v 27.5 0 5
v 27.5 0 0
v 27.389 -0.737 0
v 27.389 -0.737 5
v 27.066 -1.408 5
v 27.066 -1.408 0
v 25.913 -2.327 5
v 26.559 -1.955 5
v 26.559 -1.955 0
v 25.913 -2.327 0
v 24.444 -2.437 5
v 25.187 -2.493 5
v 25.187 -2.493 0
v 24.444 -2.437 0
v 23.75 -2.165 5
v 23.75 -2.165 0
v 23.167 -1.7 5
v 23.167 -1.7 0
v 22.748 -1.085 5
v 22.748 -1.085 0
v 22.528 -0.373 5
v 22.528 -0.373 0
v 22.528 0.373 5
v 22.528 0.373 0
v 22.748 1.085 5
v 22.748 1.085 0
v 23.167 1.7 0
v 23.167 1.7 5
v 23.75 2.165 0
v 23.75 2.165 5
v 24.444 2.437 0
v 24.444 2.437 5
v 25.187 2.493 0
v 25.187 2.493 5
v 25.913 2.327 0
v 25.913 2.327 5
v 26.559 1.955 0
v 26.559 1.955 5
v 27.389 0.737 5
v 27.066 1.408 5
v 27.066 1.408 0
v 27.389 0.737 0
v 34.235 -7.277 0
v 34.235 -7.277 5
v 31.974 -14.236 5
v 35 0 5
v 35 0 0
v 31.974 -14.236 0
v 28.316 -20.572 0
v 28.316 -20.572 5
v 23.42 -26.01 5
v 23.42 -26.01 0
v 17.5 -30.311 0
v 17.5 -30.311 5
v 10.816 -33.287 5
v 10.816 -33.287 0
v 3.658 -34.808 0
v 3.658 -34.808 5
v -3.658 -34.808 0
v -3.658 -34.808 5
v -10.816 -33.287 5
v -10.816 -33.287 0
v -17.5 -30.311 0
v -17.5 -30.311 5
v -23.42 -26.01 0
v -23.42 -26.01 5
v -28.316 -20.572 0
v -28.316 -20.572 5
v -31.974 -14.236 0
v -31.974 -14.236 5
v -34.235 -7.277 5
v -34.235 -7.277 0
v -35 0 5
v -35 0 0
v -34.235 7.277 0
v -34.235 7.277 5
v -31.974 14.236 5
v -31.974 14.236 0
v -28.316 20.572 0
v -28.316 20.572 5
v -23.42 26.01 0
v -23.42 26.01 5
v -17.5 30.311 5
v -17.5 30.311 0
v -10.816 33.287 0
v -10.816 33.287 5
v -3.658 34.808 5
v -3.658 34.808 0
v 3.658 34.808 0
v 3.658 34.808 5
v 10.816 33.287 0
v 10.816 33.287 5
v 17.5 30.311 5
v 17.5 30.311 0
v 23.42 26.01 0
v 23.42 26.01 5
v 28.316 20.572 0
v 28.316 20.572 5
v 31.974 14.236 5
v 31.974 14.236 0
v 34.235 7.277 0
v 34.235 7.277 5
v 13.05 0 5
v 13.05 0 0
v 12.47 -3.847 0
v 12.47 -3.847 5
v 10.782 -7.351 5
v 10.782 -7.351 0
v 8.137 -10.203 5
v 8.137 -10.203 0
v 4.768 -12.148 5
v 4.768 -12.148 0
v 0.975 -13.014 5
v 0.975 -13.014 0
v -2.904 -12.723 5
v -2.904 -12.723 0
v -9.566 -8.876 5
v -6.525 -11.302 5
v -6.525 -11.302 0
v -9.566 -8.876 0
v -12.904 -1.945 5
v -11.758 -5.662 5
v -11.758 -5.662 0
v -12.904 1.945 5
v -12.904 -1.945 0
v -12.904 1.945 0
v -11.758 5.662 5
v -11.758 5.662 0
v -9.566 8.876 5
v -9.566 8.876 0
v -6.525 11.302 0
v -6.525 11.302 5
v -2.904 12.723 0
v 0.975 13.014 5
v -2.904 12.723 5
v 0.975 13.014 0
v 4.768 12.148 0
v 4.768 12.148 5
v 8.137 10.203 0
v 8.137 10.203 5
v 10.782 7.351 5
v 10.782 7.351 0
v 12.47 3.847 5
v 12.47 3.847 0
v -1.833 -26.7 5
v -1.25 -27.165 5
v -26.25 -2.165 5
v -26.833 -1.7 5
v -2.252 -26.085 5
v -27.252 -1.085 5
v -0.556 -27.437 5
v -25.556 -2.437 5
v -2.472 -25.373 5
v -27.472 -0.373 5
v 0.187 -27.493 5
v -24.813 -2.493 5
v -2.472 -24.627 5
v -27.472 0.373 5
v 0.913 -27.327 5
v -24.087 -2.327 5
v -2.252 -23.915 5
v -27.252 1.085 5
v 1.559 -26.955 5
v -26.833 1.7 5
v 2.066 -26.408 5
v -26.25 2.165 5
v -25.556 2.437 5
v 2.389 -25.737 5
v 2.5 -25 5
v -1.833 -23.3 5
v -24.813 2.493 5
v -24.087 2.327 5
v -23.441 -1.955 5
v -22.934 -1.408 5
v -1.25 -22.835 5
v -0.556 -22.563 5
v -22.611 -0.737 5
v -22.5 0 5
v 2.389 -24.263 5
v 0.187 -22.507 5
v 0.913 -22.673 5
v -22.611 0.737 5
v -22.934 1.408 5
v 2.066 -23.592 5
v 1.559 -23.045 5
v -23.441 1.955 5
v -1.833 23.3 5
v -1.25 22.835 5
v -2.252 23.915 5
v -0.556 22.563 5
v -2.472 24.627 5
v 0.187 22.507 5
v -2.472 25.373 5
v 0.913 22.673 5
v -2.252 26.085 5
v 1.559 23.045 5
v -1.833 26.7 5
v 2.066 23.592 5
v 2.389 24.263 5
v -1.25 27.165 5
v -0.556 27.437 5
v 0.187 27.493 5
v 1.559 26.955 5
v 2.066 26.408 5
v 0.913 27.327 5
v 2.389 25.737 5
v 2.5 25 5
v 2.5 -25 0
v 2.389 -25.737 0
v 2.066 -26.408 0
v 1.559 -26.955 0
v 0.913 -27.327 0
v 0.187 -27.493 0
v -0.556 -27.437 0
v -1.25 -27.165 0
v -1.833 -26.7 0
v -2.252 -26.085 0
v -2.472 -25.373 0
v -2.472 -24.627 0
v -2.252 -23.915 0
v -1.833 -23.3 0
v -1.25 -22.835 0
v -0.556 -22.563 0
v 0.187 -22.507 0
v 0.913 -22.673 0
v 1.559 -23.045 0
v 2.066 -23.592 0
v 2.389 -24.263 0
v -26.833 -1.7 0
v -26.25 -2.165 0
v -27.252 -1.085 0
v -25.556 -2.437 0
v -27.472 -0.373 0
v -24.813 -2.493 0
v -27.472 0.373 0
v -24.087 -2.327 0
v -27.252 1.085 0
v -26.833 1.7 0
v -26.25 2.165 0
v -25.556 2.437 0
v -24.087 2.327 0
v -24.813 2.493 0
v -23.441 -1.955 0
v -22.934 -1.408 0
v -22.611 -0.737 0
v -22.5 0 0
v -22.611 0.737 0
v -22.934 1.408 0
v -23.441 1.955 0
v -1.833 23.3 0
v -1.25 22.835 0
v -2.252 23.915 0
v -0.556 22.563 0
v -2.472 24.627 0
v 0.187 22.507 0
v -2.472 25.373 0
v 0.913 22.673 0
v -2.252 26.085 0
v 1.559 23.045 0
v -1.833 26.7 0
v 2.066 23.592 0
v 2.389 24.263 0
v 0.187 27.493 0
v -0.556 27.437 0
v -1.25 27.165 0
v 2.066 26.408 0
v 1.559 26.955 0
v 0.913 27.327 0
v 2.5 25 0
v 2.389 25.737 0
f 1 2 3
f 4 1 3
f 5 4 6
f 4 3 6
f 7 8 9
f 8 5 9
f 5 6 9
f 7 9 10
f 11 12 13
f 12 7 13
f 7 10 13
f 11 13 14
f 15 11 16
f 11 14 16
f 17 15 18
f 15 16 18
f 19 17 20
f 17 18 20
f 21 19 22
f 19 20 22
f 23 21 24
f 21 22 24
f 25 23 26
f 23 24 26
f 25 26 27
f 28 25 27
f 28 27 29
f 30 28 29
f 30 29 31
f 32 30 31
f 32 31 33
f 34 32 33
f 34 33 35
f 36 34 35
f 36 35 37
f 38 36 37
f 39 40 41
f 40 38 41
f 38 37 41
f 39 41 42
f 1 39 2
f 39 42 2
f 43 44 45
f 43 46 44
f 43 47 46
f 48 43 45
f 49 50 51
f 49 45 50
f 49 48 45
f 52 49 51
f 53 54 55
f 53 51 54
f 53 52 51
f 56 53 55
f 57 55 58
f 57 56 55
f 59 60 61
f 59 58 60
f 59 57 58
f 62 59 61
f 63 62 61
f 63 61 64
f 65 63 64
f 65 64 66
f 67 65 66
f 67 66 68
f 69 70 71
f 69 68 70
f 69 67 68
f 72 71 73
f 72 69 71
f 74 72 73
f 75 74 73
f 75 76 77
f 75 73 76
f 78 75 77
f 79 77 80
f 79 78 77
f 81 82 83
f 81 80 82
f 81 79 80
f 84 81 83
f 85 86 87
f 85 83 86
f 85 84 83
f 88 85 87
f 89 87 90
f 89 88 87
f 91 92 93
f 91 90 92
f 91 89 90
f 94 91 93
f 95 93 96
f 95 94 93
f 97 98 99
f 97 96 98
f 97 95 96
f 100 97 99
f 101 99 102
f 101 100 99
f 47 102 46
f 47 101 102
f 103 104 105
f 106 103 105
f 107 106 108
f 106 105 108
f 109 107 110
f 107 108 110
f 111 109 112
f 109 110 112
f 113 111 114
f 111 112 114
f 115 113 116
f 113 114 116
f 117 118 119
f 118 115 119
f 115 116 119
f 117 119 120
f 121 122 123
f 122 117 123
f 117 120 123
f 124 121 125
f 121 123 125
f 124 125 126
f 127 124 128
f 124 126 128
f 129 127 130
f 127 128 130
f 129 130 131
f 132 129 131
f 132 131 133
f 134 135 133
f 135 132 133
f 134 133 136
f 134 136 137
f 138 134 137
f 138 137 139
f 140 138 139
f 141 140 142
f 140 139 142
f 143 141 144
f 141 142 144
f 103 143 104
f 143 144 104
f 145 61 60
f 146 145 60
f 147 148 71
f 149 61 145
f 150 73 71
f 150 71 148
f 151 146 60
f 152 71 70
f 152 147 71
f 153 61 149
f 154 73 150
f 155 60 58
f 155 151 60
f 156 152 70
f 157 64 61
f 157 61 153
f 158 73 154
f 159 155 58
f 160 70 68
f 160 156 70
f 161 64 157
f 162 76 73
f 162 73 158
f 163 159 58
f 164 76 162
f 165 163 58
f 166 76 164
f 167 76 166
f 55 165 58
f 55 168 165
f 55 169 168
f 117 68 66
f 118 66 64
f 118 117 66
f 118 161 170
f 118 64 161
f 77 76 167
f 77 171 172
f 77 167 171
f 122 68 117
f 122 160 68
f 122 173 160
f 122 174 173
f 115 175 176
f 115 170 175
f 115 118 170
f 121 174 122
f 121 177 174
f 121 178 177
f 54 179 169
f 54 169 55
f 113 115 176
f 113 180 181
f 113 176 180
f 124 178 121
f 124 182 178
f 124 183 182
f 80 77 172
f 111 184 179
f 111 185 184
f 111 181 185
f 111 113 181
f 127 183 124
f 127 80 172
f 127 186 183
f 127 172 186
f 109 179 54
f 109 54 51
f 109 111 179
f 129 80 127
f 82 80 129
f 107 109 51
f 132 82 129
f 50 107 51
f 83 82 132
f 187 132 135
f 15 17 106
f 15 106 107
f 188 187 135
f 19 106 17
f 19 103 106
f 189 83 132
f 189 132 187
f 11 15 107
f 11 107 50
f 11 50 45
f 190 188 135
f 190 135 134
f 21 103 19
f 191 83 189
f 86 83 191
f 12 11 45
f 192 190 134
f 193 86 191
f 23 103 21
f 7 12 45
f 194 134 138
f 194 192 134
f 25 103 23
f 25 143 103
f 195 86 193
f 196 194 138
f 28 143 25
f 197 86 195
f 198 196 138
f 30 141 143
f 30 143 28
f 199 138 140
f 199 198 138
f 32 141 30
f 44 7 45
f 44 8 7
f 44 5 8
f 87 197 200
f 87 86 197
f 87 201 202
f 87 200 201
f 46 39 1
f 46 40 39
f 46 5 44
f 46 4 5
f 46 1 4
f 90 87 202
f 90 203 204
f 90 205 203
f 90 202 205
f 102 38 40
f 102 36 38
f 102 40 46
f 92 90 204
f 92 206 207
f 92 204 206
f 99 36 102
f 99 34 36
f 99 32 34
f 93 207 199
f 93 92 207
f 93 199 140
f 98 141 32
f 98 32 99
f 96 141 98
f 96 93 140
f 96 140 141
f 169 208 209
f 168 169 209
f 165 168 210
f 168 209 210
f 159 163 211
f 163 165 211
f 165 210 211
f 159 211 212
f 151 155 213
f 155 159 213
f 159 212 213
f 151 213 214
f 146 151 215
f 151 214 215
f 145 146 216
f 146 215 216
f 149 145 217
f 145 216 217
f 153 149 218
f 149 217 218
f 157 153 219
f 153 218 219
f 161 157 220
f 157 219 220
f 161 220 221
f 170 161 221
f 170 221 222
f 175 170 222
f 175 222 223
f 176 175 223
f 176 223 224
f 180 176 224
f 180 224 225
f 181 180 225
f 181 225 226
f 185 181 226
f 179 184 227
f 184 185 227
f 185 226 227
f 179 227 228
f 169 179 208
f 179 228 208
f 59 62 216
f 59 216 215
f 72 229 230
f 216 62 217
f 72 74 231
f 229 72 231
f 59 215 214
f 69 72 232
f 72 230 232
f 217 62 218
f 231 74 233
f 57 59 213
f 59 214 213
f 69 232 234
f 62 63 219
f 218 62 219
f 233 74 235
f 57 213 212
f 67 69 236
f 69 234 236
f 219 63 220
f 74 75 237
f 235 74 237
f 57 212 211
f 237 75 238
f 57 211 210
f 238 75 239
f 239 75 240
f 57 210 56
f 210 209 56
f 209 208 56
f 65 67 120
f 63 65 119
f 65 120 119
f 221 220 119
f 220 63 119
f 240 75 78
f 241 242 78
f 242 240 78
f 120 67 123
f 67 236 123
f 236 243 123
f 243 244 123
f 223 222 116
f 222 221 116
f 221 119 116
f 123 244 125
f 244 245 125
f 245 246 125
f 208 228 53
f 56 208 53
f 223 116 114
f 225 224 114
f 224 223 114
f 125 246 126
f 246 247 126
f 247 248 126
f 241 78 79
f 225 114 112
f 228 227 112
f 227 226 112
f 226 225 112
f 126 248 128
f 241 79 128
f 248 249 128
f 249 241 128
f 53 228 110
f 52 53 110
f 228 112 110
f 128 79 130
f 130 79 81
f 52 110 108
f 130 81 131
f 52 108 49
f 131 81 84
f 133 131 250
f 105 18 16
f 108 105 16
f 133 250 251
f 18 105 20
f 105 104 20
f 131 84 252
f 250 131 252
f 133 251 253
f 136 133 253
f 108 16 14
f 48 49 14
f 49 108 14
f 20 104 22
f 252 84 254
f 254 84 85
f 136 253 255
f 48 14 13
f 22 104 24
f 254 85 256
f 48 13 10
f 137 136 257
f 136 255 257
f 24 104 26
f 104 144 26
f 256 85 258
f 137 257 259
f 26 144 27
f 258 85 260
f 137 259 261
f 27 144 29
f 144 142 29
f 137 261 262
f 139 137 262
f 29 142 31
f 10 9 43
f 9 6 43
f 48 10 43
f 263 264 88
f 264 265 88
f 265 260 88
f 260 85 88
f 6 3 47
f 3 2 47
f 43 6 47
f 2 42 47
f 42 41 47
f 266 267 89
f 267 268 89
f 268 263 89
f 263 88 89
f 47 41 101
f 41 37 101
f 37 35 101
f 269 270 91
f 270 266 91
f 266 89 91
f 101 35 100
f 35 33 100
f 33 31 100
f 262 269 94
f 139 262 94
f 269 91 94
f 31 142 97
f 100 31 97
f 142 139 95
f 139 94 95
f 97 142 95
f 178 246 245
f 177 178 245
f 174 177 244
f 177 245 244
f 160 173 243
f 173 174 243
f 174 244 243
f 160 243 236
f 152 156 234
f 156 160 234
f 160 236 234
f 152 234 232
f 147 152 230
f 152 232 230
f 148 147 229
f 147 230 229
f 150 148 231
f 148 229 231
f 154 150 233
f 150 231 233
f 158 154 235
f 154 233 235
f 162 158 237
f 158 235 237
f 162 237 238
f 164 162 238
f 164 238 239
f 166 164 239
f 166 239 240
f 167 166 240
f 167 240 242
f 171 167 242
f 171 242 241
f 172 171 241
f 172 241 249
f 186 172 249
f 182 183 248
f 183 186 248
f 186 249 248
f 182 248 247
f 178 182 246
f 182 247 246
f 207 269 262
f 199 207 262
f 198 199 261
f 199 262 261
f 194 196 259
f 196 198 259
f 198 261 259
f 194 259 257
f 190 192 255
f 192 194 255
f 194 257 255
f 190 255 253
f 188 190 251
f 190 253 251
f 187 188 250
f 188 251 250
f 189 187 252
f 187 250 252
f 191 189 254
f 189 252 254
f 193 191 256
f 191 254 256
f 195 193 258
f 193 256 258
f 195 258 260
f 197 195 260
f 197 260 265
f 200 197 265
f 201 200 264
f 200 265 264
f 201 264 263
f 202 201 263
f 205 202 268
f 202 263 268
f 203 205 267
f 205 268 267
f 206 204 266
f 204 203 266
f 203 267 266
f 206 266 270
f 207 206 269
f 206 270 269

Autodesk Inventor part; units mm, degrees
ref_plane "YZ Plane" through (0, 0, 0) normal (1, 0, 0) x (0, 1, 0)
ref_plane "XZ Plane" through (0, 0, 0) normal (0, 1, 0) x (-1, 0, 0)
ref_plane "XY Plane" through (0, 0, 0) normal (0, 0, 1) x (1, 0, 0)
sketch "スケッチ1" plane through (0, 0, 0) normal (0, 0, 1) x (1, 0, 0)
  circle A0 centre (0, 0) radius 35
  circle A1 centre (0, 0) radius 13.05
  circle A2 centre (0, 0) radius 25 construction
  line L0 (0, 35) -> (0, 0) construction
  line L1 (0, 0) -> (35, 0) construction
  circle A3 centre (25, 0) radius 2.5
  circle A4 centre (0, 25) radius 2.5
  circle A5 centre (-25, 0) radius 2.5
  circle A6 centre (0, -25) radius 2.5
  dimension "d3" = 50
  dimension "d0" = 26.1
  dimension "d1" = 70
  dimension "d2" = 5
  dimension "d6" = 360
extrude "押し出し1" add sketch "スケッチ1" along normal blind 5
properties part number "車軸受け板3"
